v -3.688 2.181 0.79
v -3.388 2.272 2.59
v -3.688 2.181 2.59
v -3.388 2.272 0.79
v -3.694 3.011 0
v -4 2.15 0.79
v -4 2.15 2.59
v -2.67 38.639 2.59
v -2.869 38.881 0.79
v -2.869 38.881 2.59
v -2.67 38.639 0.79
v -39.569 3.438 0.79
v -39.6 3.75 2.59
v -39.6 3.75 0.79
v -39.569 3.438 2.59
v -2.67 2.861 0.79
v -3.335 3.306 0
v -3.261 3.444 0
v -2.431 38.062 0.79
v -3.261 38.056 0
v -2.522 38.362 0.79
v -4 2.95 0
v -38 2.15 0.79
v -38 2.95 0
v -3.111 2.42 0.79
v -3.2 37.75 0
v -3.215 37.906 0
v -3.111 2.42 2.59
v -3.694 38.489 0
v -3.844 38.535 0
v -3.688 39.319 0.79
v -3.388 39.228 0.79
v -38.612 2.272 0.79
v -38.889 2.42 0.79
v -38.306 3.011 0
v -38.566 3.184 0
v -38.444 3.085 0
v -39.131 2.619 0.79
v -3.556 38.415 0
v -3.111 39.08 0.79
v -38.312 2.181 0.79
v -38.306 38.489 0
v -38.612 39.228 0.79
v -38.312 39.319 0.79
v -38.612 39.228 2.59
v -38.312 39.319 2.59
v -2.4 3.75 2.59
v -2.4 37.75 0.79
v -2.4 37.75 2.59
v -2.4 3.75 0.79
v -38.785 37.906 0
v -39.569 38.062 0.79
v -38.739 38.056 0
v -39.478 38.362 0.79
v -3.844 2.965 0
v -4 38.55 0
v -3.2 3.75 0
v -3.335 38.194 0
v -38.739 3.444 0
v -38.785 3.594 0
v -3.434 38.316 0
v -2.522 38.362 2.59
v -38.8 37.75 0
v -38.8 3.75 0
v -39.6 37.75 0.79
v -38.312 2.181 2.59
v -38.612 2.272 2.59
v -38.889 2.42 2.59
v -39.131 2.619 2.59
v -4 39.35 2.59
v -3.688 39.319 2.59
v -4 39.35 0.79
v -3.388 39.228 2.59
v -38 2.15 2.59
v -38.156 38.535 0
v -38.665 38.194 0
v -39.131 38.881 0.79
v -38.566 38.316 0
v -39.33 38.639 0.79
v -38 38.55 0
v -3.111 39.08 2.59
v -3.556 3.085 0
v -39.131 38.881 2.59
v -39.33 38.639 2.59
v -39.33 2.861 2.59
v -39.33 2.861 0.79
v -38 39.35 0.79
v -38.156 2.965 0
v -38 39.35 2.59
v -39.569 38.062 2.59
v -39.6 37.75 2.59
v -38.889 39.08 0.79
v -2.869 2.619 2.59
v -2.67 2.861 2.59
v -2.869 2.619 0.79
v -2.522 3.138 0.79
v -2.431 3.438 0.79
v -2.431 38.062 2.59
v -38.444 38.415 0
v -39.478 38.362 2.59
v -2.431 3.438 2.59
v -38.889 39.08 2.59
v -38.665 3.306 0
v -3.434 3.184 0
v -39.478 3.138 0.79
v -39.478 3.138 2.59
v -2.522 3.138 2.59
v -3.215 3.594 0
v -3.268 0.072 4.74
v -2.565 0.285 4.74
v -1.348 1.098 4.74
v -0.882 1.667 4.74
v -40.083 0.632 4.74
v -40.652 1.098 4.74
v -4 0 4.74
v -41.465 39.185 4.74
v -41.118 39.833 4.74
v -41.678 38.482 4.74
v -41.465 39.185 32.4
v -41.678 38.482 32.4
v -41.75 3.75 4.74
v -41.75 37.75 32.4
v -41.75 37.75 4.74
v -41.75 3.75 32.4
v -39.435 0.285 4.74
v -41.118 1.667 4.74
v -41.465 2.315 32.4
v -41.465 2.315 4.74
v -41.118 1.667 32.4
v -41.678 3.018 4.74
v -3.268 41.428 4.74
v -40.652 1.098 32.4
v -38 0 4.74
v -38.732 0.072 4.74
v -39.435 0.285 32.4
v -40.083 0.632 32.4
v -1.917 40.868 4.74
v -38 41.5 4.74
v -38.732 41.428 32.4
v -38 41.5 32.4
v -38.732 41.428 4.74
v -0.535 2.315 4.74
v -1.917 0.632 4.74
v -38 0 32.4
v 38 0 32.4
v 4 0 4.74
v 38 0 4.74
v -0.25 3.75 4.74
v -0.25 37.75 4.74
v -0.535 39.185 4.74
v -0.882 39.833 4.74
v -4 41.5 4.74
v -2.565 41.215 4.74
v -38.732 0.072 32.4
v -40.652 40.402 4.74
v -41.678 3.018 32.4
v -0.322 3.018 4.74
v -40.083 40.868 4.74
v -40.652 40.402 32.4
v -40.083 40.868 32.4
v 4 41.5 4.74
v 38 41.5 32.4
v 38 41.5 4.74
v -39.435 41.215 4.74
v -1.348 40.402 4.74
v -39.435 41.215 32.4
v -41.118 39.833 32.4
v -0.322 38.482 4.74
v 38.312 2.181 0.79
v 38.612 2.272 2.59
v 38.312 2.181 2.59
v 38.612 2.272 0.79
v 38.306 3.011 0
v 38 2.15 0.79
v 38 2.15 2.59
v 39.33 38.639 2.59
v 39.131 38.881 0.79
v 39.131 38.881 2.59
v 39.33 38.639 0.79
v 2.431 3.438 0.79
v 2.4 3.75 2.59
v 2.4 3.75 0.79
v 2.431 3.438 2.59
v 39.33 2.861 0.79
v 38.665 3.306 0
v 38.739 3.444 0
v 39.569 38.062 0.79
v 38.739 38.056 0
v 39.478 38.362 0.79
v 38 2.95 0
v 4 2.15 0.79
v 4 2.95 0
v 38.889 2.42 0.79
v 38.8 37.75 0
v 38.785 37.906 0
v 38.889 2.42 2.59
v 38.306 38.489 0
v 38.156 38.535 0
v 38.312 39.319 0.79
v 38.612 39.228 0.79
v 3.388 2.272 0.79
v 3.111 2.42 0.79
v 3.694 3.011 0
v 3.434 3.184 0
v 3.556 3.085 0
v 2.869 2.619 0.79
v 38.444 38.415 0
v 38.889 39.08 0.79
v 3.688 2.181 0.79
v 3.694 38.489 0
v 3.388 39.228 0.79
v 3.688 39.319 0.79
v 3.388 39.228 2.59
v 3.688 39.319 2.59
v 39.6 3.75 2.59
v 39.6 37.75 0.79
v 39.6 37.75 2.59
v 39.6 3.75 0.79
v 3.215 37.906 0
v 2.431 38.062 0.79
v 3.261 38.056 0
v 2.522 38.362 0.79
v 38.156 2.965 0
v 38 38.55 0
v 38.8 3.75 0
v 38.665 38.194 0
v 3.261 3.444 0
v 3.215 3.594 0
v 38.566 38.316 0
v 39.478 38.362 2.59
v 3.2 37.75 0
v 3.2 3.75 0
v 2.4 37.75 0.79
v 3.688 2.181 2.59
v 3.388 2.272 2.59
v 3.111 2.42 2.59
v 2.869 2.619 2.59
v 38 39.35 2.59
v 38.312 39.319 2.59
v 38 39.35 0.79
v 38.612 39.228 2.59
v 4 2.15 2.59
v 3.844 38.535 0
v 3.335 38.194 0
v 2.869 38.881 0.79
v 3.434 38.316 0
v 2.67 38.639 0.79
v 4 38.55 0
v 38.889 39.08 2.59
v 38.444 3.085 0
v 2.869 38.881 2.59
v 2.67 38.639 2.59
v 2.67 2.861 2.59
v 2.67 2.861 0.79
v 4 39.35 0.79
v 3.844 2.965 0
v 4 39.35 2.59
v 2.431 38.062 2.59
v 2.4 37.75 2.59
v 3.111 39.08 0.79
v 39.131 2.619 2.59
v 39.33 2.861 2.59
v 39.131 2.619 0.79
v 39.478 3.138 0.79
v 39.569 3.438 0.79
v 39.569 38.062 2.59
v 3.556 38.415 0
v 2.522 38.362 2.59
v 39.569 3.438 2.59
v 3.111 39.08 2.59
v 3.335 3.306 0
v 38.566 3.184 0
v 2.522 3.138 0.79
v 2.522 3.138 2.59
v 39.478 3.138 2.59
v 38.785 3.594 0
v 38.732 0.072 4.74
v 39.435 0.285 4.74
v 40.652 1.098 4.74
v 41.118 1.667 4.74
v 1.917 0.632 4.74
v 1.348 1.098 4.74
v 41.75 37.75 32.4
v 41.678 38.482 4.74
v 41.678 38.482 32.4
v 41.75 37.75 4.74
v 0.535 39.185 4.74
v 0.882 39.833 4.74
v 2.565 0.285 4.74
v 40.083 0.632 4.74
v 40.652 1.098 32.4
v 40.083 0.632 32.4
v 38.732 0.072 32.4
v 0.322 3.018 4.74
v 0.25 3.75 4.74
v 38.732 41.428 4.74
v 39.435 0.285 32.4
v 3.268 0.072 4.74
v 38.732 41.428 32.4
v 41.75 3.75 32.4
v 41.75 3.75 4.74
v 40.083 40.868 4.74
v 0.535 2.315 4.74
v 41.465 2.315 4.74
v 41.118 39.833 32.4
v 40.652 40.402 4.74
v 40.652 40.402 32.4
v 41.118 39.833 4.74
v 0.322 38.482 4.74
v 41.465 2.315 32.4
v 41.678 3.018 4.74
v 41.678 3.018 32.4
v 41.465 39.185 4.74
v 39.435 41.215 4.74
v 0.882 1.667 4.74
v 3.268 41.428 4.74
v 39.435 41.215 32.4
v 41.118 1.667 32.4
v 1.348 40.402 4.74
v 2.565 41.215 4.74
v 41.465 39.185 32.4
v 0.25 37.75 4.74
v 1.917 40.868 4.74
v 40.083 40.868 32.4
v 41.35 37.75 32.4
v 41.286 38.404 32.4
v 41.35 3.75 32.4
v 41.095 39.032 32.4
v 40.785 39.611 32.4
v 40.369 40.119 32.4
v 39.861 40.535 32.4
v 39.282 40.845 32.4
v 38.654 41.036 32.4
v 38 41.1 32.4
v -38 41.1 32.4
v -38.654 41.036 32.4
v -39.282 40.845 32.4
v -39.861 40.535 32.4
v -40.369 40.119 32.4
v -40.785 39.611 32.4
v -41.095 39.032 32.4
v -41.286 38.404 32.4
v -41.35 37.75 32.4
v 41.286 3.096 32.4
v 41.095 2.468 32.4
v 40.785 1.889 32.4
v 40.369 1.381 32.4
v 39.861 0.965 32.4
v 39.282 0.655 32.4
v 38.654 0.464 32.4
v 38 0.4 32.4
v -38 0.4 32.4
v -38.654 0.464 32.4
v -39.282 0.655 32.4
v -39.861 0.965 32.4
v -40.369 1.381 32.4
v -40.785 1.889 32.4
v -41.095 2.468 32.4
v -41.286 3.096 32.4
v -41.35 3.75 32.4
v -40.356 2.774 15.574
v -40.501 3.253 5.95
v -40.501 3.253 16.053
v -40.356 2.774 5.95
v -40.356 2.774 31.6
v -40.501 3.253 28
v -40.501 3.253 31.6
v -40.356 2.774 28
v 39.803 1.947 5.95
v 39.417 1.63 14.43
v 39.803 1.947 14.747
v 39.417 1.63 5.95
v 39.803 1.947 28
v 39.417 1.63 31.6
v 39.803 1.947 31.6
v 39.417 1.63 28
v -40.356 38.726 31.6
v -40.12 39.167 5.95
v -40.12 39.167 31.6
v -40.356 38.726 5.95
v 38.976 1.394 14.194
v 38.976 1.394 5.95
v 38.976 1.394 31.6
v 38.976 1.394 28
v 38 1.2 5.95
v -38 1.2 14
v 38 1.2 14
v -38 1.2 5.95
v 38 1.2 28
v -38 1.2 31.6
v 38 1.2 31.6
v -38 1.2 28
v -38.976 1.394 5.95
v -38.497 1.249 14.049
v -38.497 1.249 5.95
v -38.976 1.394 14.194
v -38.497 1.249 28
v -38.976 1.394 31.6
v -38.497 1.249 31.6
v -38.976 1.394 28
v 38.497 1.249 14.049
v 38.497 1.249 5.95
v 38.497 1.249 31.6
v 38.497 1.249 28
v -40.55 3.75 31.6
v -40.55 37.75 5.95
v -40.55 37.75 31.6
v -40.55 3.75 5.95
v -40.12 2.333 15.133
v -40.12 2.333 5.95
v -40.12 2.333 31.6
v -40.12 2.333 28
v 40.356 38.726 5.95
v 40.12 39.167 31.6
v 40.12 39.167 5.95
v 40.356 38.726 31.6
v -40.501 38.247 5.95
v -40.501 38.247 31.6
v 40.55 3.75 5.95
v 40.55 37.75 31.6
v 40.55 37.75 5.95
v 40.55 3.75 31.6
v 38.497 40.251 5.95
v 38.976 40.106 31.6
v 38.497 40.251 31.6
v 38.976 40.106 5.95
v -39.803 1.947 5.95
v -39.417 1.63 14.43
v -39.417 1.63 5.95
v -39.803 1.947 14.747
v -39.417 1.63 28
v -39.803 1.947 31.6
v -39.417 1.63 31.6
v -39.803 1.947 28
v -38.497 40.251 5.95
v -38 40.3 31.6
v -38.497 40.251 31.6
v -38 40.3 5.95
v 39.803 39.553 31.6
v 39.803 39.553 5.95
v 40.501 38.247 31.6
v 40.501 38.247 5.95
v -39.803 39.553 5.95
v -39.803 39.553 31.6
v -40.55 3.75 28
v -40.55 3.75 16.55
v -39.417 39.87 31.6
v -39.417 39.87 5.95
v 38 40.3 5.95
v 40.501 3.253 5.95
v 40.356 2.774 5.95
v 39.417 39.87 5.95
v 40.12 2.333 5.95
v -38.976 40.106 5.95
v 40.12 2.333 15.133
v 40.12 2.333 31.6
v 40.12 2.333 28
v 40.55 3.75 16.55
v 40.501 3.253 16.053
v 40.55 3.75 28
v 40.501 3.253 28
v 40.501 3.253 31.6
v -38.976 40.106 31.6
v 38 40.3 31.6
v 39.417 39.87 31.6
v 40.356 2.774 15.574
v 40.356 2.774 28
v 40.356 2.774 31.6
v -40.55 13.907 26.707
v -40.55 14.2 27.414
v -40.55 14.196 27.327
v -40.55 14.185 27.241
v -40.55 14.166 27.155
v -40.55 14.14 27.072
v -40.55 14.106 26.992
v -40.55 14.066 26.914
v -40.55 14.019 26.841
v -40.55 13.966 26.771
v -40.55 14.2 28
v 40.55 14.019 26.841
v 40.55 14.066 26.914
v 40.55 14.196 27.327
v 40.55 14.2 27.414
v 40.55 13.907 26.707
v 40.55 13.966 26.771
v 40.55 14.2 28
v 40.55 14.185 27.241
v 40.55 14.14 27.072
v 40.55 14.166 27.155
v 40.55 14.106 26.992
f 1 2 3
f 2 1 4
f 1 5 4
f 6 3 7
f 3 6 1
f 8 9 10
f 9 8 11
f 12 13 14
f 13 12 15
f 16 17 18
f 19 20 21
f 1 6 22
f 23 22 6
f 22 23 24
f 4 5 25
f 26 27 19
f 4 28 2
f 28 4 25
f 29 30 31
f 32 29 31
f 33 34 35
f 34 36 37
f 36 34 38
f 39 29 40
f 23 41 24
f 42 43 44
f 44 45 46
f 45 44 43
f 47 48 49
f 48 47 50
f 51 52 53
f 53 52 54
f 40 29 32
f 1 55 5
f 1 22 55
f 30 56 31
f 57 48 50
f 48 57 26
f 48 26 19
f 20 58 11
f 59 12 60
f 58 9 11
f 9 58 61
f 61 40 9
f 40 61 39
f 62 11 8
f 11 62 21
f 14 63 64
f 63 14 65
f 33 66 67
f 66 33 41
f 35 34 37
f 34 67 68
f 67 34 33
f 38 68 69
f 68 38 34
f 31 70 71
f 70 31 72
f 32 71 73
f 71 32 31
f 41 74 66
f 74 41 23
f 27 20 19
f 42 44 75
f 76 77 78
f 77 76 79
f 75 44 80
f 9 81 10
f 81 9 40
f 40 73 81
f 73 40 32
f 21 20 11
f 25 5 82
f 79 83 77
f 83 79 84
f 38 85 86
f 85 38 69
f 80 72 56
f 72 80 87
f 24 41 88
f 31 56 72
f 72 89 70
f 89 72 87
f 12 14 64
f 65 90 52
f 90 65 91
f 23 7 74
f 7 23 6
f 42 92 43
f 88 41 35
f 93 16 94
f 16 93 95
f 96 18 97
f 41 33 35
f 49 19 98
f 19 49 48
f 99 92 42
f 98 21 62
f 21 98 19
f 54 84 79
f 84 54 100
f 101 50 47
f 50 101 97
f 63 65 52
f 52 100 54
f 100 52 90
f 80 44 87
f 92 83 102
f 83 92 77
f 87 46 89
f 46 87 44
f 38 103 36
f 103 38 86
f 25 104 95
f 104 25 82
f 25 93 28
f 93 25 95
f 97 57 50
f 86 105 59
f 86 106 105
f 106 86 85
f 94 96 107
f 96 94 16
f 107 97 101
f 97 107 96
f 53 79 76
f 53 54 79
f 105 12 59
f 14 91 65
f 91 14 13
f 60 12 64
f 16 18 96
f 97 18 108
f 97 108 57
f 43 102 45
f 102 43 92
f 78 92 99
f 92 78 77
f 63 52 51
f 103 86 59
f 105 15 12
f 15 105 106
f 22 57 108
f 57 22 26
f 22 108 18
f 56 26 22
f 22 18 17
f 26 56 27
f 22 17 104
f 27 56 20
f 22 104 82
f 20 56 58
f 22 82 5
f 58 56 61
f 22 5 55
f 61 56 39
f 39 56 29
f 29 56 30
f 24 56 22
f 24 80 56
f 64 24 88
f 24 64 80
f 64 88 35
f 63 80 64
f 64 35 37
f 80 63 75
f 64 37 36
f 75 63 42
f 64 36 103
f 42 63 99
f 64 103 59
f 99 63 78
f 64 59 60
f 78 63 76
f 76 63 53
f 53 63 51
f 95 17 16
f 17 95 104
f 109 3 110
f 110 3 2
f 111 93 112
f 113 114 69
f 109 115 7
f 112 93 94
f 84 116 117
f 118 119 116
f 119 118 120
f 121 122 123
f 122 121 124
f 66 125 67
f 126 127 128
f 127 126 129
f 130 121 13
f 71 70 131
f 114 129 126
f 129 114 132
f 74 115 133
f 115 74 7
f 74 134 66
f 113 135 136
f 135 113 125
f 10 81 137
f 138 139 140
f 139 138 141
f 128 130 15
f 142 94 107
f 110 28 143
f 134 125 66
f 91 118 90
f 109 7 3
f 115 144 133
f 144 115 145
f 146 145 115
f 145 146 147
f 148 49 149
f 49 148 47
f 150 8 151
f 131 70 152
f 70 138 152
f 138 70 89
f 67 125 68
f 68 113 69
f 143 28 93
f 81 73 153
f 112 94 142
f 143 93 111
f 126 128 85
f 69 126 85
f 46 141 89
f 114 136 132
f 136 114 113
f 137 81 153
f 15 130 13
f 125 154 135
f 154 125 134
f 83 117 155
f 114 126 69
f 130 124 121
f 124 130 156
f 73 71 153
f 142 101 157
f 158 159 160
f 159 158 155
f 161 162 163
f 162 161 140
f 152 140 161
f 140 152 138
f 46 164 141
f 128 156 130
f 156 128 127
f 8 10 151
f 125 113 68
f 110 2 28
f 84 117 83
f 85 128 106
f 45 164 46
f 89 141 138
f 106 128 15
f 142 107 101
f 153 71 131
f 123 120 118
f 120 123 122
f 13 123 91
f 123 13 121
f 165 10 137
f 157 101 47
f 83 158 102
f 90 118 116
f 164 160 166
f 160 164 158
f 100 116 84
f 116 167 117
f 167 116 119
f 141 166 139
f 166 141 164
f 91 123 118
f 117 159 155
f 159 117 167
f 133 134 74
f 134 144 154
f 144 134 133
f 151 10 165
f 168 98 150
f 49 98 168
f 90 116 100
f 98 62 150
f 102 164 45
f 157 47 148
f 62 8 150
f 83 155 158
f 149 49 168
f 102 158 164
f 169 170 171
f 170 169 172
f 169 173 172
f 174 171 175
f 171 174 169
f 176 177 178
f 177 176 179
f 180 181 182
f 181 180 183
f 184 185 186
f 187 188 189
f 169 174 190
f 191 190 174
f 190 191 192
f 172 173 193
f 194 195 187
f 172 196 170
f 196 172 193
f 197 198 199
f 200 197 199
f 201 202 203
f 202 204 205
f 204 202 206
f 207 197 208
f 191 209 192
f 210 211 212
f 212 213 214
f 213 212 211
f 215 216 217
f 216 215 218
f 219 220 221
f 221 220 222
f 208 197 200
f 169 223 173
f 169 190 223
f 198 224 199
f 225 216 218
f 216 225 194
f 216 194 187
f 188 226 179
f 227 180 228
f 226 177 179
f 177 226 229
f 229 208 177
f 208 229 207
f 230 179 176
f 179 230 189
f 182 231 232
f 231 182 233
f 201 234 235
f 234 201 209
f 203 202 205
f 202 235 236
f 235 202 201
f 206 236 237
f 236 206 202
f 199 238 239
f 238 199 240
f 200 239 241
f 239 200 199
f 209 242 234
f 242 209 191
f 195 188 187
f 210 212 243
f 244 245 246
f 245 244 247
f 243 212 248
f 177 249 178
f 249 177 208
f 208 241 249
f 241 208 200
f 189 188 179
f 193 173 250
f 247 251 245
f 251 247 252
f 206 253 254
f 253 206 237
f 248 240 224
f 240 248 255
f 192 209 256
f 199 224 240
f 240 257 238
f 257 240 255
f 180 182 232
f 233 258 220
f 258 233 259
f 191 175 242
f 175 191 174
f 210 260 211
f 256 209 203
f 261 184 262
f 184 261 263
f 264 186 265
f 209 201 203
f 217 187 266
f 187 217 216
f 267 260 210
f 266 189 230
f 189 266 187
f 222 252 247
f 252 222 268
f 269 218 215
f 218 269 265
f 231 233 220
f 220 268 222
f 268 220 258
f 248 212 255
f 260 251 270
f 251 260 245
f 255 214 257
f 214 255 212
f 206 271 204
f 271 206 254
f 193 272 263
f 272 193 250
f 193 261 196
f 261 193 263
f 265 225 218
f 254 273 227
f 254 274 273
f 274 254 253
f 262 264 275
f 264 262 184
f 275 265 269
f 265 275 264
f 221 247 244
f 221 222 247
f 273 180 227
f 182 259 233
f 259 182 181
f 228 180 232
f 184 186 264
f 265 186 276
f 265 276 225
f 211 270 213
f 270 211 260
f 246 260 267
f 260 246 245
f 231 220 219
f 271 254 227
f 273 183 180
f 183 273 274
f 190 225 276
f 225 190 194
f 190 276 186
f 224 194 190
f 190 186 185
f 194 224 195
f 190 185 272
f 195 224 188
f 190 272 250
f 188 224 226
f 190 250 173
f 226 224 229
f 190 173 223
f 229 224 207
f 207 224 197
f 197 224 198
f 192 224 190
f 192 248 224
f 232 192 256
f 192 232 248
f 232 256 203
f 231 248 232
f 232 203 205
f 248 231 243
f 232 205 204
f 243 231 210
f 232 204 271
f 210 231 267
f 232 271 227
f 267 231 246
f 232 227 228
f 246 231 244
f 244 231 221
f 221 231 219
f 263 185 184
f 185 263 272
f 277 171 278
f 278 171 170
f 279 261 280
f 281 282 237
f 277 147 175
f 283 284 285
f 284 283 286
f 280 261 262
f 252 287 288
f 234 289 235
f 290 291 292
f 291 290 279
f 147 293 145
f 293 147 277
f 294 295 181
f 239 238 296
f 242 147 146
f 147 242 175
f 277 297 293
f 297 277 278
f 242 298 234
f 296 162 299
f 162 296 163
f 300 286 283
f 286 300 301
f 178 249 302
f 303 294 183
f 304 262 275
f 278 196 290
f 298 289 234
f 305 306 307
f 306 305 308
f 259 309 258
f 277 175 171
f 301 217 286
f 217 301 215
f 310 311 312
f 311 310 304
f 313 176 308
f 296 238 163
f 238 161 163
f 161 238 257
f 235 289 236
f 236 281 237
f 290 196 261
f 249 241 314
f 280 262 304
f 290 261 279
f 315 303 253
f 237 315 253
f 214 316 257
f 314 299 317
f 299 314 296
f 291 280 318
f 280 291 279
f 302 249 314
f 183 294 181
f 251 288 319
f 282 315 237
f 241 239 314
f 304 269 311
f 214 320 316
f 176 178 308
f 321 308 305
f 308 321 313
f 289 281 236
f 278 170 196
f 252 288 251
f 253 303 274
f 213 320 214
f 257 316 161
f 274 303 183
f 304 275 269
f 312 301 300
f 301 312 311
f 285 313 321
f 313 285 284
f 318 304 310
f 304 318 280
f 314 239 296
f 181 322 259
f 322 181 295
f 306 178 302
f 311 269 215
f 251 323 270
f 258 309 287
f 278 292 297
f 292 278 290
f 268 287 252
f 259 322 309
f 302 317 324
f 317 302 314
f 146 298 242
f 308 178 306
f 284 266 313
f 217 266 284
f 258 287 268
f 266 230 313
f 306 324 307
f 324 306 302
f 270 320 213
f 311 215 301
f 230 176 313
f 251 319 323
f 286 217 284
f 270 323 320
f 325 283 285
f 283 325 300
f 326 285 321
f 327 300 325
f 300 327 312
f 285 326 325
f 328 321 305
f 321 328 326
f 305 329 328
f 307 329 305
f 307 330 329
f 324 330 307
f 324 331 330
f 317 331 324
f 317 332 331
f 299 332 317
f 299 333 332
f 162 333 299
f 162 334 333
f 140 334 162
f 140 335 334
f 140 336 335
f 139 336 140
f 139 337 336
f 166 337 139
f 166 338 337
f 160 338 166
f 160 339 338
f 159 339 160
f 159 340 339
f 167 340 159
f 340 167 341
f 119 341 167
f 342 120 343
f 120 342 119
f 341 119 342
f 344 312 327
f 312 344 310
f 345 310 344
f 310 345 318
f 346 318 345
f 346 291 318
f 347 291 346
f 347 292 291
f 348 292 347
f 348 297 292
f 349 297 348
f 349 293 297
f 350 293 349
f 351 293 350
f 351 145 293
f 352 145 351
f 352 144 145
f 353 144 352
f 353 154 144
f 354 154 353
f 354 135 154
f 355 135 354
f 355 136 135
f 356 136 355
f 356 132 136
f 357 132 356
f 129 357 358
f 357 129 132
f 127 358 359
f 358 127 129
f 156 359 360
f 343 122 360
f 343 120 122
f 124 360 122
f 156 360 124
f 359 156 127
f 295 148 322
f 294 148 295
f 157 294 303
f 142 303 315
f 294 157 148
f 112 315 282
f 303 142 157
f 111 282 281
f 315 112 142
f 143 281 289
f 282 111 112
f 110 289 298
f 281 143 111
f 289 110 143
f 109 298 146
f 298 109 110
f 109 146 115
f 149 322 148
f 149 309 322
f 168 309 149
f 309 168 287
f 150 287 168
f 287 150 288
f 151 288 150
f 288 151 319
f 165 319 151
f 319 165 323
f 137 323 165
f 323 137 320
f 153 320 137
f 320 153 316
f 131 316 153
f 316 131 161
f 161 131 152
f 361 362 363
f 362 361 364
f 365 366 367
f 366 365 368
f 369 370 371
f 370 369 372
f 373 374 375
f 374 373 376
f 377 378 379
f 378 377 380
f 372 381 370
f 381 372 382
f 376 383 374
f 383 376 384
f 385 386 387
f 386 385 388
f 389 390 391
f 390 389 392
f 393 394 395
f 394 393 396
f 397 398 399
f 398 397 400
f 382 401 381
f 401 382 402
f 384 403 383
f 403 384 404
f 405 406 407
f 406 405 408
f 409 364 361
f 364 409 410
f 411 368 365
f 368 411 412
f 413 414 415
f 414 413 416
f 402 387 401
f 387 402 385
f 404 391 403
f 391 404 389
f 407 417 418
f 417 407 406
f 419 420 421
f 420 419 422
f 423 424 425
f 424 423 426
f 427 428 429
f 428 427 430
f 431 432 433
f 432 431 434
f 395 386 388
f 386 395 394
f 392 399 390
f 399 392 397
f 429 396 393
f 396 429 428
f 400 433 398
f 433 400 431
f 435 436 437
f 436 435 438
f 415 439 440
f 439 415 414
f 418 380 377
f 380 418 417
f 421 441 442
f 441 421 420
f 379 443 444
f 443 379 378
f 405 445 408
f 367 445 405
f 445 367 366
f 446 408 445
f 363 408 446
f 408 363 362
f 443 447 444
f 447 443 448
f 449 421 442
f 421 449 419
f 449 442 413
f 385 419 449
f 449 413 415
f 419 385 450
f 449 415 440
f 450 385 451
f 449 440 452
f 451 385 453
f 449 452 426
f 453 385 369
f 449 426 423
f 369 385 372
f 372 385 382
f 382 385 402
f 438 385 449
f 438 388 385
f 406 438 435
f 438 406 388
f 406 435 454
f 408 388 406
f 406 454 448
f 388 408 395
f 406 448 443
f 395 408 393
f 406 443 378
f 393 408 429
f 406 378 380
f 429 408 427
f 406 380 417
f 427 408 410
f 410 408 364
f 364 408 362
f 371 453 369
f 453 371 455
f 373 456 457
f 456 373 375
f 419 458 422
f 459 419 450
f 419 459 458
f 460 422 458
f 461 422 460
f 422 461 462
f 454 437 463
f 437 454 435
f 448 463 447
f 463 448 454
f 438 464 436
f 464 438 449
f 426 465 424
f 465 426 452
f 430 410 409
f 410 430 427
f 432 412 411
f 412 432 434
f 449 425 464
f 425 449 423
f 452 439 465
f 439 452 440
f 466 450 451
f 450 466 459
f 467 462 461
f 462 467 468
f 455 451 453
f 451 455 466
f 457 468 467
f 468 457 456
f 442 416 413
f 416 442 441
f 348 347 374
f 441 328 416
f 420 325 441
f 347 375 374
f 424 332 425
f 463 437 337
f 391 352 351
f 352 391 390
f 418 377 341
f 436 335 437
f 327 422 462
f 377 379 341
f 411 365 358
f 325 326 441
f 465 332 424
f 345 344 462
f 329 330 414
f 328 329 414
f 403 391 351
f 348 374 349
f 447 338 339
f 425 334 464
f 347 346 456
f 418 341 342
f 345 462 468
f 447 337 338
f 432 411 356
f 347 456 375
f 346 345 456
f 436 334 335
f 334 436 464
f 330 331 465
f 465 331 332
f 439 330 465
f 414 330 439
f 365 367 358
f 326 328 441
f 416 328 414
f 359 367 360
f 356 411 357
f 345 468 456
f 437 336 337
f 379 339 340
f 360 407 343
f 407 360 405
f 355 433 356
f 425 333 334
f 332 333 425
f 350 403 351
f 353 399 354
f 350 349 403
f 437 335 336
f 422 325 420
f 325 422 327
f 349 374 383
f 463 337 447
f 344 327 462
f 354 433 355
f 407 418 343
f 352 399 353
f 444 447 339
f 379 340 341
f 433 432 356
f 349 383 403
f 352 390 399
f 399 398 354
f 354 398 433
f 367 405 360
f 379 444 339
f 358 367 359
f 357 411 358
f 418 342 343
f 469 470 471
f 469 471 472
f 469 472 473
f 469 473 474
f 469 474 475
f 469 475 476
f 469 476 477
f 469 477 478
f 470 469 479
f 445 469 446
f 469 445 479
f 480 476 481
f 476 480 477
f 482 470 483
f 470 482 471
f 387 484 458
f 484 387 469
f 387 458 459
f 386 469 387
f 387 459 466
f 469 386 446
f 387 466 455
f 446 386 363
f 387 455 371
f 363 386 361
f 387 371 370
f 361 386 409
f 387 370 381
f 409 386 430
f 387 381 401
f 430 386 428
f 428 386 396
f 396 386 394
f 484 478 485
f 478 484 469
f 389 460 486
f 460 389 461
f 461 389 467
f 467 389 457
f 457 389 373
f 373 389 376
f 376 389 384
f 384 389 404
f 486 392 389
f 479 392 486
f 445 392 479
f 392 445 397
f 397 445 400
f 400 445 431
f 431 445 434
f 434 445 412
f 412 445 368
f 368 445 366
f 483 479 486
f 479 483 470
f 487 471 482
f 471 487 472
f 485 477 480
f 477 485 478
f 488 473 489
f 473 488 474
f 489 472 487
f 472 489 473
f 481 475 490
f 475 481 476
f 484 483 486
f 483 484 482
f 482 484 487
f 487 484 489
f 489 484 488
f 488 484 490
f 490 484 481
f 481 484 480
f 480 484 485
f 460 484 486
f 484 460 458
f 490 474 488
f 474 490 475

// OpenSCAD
// file: ../../modules/gridfinity.scad
// Gridfinity ベースプレートの共有 module。
// 寸法は Gridfinity 仕様 (Zack Freedman) の baseplate 輪郭に従う:
//   ピッチ 42、ソケット上端開口 41.5 (角 R4)、上から 45° 面取り 2.15 →
//   垂直 1.8 (37.2 角・R1.85) → 45° 面取り 0.7 → 底 35.8 角 (R1.15)。
//   ソケット深さ = 2.15 + 1.8 + 0.7 = 4.65。
//
// 座標系: X が列方向 (中央が 0)、Y が行方向 (板の前端が 0)、Z=0 が板の底面。
// 板の外形は grid とは独立に rim で与えるので、grid より大きい板 (縁付き) を
// 作れる。ソケットは rim=[left, right, front, back] の内側へ 42 ピッチで並ぶ。

gf_pitch = 42;
gf_socket_top = 41.5; // 上端開口
gf_socket_mid = 37.2; // 垂直部
gf_socket_bot = 35.8; // 底
gf_socket_r_top = 4;
gf_socket_r_mid = 1.85;
gf_socket_r_bot = 1.15;
gf_chamfer_top = 2.15;
gf_wall_h = 1.8;
gf_chamfer_bot = 0.7;
gf_socket_depth = gf_chamfer_top + gf_wall_h + gf_chamfer_bot; // 4.65
gf_fn = 32;
gf_eps = 0.01; // hull 用の薄板の厚さ
gf_over = 0.5; // 切削の抜き代

// 角丸正方形 (一辺 w、角 R)
module
gf_rounded_square(w, r)
{
    offset(r = r, $fn = gf_fn) square(w - 2 * r, center = true);
}

// 厚さ gf_eps の角丸正方形の薄板を z に置く (hull の骨)
module
gf_slab(w, r, z)
{
    translate([ 0, 0, z ]) linear_extrude(gf_eps) gf_rounded_square(w, r);
}

// ソケット1個の切削体。z=0 がソケットの底 (床の天面)、+Z へ 4.65 で天面に出る。
// clearance は嵌合の逃げで、輪郭を全周へ clearance だけ外へ出す (幅 +2c、角 R
// +c)。 既定 0 が Gridfinity の公称輪郭。深さとピッチは変えない
module
gf_socket_cut(clearance = 0)
{
    z1 = gf_chamfer_bot;
    z2 = z1 + gf_wall_h;
    z3 = gf_socket_depth;
    c = clearance;
    hull()
    {
        gf_slab(gf_socket_bot + 2 * c, gf_socket_r_bot + c, 0);
        gf_slab(gf_socket_mid + 2 * c, gf_socket_r_mid + c, z1 - gf_eps);
    }
    hull()
    {
        gf_slab(gf_socket_mid + 2 * c, gf_socket_r_mid + c, z1 - gf_eps);
        gf_slab(gf_socket_mid + 2 * c, gf_socket_r_mid + c, z2 - gf_eps);
    }
    hull()
    {
        gf_slab(gf_socket_mid + 2 * c, gf_socket_r_mid + c, z2 - gf_eps);
        gf_slab(gf_socket_top + 2 * c, gf_socket_r_top + c, z3 - gf_eps);
    }
    // 天面より上へ抜く (天面と同一平面の退化した面を残さない)
    gf_slab(gf_socket_top + 2 * c, gf_socket_r_top + c, z3 - gf_eps);
    translate([ 0, 0, z3 - gf_eps ]) linear_extrude(gf_over + gf_eps)
        gf_rounded_square(gf_socket_top + 2 * c, gf_socket_r_top + c);
}

// ベースプレート。cols x rows のソケットを床 floor_t の上に彫る。
// rim = [left, right, front, back] はソケット列の外側に残す縁の幅。
// 板の幅 = cols*42 + left + right、奥行き = rows*42 + front + back。
// clearance はソケットの嵌合の逃げ (gf_socket_cut を参照)。
module
gf_baseplate(cols, rows, rim = [ 0, 0, 0, 0 ], floor_t = 1, clearance = 0)
{
    grid_w = cols * gf_pitch;
    grid_d = rows * gf_pitch;
    plate_w = grid_w + rim[0] + rim[1];
    plate_d = grid_d + rim[2] + rim[3];
    x0 = -plate_w / 2 + rim[0]; // ソケット列の左端
    difference()
    {
        translate([ -plate_w / 2, 0, 0 ])
            cube([ plate_w, plate_d, floor_t + gf_socket_depth ]);
        for (c = [0:cols - 1], r = [0:rows - 1])
            translate([
                x0 + (c + 0.5) * gf_pitch,
                rim[2] + (r + 0.5) * gf_pitch,
                floor_t
            ]) gf_socket_cut(clearance);
    }
}
// file: ../../modules/gridfinity_bin.scad
include <gridfinity.scad>

// Gridfinity bin (箱) の共有 module。ピッチと角丸は gridfinity.scad
// と共有する。 底の輪郭は Gridfinity 仕様の bin base (下から):
//   35.6 角 (R0.8) → 45° 0.8 → 37.2 角 (R1.6) → 垂直 1.8 → 45° 2.15 → 41.5 角
//   (R3.75) 高さ 0.8 + 1.8 + 2.15 = 4.75。磁石穴・ネジ穴は持たない (無垢)
// 外形はピッチ − 0.5 (1 マス 41.5)、角 R3.75。高さ単位 7 (4U = 28 が壁の上端)。
// リップは「薄いリップ」: 壁 (1.2) をそのまま lip_h (4.4) 伸ばし、内側の上端を
// 45° に落とすだけ。内側に棚 (厚い肉) を持たないので、上に載せる bin は底の
// 面取りをこの 45° に座らせる。
//
// 座標系: X が列方向 (中央 0)、Y が行方向 (手前 = ラベル側が 0)、Z=0 が底面。

gfb_outer = gf_pitch - 0.5; // 41.5
gfb_outer_r = 3.75;
gfb_base_bot = 35.6;
gfb_base_bot_r = 0.8;
gfb_base_mid = 37.2;
gfb_base_mid_r = 1.6;
gfb_base_chamfer_bot = 0.8;
gfb_base_wall_h = 1.8;
gfb_base_chamfer_top = 2.15;
gfb_base_h =
    gfb_base_chamfer_bot + gfb_base_wall_h + gfb_base_chamfer_top; // 4.75
gfb_unit = 7;
gfb_lip_h = 4.4;
gfb_lip_chamfer = 0.8;

// bin 1 マスぶんの底 (無垢)。z=0 が底面、gfb_base_h で外形 41.5 角に達する
module
gfb_base_cell()
{
    z1 = gfb_base_chamfer_bot;
    z2 = z1 + gfb_base_wall_h;
    z3 = gfb_base_h;
    hull()
    {
        gf_slab(gfb_base_bot, gfb_base_bot_r, 0);
        gf_slab(gfb_base_mid, gfb_base_mid_r, z1 - gf_eps);
    }
    hull()
    {
        gf_slab(gfb_base_mid, gfb_base_mid_r, z1 - gf_eps);
        gf_slab(gfb_base_mid, gfb_base_mid_r, z2 - gf_eps);
    }
    hull()
    {
        gf_slab(gfb_base_mid, gfb_base_mid_r, z2 - gf_eps);
        gf_slab(gfb_outer, gfb_outer_r, z3 - gf_eps);
    }
}

// cols x rows の角丸矩形 (外形)
module
gfb_footprint(cols, rows, inset = 0)
{
    w = cols * gf_pitch - 0.5 - 2 * inset;
    d = rows * gf_pitch - 0.5 - 2 * inset;
    translate([ 0, d / 2 + inset ])
        gf_rounded_square_wd(w, d, gfb_outer_r - inset);
}

// 幅 w × 奥行き d の角丸矩形 (中心が原点)
module
gf_rounded_square_wd(w, d, r)
{
    offset(r = r, $fn = gf_fn) square([ w - 2 * r, d - 2 * r ], center = true);
}

// ラベル天板の Y-Z 断面 (y = 壁の内面からの距離、z = 高さ)。天板 (厚さ t) の
// 先端から 45° の斜面が壁まで下りる無垢のくさび。先端の垂直面と斜面の境目
// (135°) を半径 r で丸める: 円弧の中心は先端の角から (-r, r·tan22.5°)、接点は
// 垂直面上の角 + (0, r·tan22.5°) と斜面上の角 + 0.4142r·(-1,-1)。壁の内側へ
// 1 だけ食い込ませて胴体と溶かす
function gfb_label_profile(d, t, h, r) =
    let(y0 = d, z0 = h - t, cy = y0 - r, cz = z0 + r * tan(22.5))
        concat([ [ -1, h ], [ d, h ] ],
               [for (a = [0:-5:-45])[cy + r * cos(a), cz + r* sin(a)]],
               [[ -1, h - t - d - 1 ]]);

// bin 本体。units は高さ (U)。wall / floor_t は壁と床の厚さ。
// label_d > 0 なら手前 (y=0) の壁の上端 (z = units*7) と面一で内側へ label_d
// 張り出す厚さ label_t のラベル天板を付ける。天板の下は 45° の無垢のくさびが
// 壁まで下りる (ブリッジもリブも無い。中身はスライサのインフィル任せ)。
// 天板の先端と 45° 面の境目は半径 label_r で丸める
module
gfb_bin(cols,
        rows,
        units = 4,
        wall = 1.2,
        floor_t = 1.2,
        label_d = 0,
        label_t = 1,
        label_r = 1)
{
    h = units * gfb_unit; // 壁の上端
    top = h + gfb_lip_h;  // リップの上端
    inner_w = cols * gf_pitch - 0.5 - 2 * wall;
    floor_top = gfb_base_h + floor_t;
    union()
    {
        // 底: マスごとの無垢の base
        for (c = [0:cols - 1], r = [0:rows - 1])
            translate([
                (c - (cols - 1) / 2) * gf_pitch,
                (r + 0.5) * gf_pitch - 0.25,
                0
            ]) gfb_base_cell();
        // 胴体: base の上から top
        // まで。内側は床の上を抜く。リップの内側の上端は 45°
        difference()
        {
            translate([ 0, 0, gfb_base_h - gf_eps ])
                linear_extrude(top - gfb_base_h + gf_eps)
                    gfb_footprint(cols, rows);
            translate([ 0, 0, floor_top ])
                linear_extrude(top - floor_top + gf_over)
                    gfb_footprint(cols, rows, wall);
            // リップ内側の面取り: 上端で wall − 0.4 まで開く
            hull()
            {
                translate([ 0, 0, top - gfb_lip_chamfer ])
                    linear_extrude(gf_eps) gfb_footprint(cols, rows, wall);
                translate([ 0, 0, top ]) linear_extrude(gf_over)
                    gfb_footprint(cols, rows, wall - gfb_lip_chamfer);
            }
        }
        // ラベル天板と 45° くさび (内幅いっぱい、同じ断面)。壁へ 1 食い込ませた
        // 矩形の柱なので、角の丸み (R3.75) の外へ出ないよう外形で切り取る
        if (label_d > 0)
            intersection()
            {
                translate([ -inner_w / 2, wall, 0 ]) rotate([ 90, 0, 90 ])
                    linear_extrude(inner_w) polygon(
                        gfb_label_profile(label_d, label_t, h, label_r));
                linear_extrude(top) gfb_footprint(cols, rows);
            }
    }
}
// file: ../../modules/gridfinity_bin_4u.scad
include <gridfinity_bin.scad>

// assets/gridfinity-bin/ の bin 群の共通値と、サイズ 3 引数の払い出し口。
// 単体では何も描かない。設計の経緯と確定値は
// ledger/designs/gridfinity-bin-4u.md が正本。 保証する範囲は cols 1..2 ×
// rows 1..5 × units 4 (assets に並ぶ 10 種)。 cols が X (横)、rows が Y
// (ラベルの壁から奥へ)、units が高さ (7mm 単位)。
wall = 1.2;    // 0.4 ノズル 3 本
floor_t = 1.2; // 底 (4.75) の上に載せる床。床の天面 z = 5.95
label_d = 13;  // 12mm 幅のラベルシールを貼る天板の張り出し
label_t = 1; // 天板の厚さ (user 指定)。下は 45° の無垢のくさび
label_r = 1; // 天板の先端と 45° 面の境目の R (user 指定)

function bin_contract(cols, rows, units) = str("CONTRACT units=",
                                               units,
                                               " pitch=",
                                               gf_pitch,
                                               " outer=",
                                               gfb_outer,
                                               " h=",
                                               units* gfb_unit,
                                               " lip=",
                                               gfb_lip_h,
                                               " base=",
                                               gfb_base_bot,
                                               "/",
                                               gfb_base_mid,
                                               "/",
                                               gfb_outer,
                                               " base_h=",
                                               gfb_base_h,
                                               " wall=",
                                               wall,
                                               " floor_top=",
                                               gfb_base_h + floor_t,
                                               " label=",
                                               label_d,
                                               "x",
                                               label_t,
                                               " wedge=45 fillet=",
                                               label_r,
                                               " bin=",
                                               cols,
                                               "x",
                                               rows,
                                               " size=",
                                               cols* gf_pitch - 0.5,
                                               "x",
                                               rows* gf_pitch - 0.5);

// (cols, rows, units) でラベル付き bin を払い出す。例: gridfinity_bin(2, 4, 4)
module
gridfinity_bin(cols, rows, units = 4)
{
    echo(bin_contract(cols, rows, units));
    gfb_bin(cols, rows, units, wall, floor_t, label_d, label_t, label_r);
}
// main file
include <../../modules/gridfinity_bin_4u.scad>

// 2x1 マス、高さ 4U のラベル天板付き bin。ラベルは手前 (y=0) 側
gridfinity_bin(2, 1, 4);
